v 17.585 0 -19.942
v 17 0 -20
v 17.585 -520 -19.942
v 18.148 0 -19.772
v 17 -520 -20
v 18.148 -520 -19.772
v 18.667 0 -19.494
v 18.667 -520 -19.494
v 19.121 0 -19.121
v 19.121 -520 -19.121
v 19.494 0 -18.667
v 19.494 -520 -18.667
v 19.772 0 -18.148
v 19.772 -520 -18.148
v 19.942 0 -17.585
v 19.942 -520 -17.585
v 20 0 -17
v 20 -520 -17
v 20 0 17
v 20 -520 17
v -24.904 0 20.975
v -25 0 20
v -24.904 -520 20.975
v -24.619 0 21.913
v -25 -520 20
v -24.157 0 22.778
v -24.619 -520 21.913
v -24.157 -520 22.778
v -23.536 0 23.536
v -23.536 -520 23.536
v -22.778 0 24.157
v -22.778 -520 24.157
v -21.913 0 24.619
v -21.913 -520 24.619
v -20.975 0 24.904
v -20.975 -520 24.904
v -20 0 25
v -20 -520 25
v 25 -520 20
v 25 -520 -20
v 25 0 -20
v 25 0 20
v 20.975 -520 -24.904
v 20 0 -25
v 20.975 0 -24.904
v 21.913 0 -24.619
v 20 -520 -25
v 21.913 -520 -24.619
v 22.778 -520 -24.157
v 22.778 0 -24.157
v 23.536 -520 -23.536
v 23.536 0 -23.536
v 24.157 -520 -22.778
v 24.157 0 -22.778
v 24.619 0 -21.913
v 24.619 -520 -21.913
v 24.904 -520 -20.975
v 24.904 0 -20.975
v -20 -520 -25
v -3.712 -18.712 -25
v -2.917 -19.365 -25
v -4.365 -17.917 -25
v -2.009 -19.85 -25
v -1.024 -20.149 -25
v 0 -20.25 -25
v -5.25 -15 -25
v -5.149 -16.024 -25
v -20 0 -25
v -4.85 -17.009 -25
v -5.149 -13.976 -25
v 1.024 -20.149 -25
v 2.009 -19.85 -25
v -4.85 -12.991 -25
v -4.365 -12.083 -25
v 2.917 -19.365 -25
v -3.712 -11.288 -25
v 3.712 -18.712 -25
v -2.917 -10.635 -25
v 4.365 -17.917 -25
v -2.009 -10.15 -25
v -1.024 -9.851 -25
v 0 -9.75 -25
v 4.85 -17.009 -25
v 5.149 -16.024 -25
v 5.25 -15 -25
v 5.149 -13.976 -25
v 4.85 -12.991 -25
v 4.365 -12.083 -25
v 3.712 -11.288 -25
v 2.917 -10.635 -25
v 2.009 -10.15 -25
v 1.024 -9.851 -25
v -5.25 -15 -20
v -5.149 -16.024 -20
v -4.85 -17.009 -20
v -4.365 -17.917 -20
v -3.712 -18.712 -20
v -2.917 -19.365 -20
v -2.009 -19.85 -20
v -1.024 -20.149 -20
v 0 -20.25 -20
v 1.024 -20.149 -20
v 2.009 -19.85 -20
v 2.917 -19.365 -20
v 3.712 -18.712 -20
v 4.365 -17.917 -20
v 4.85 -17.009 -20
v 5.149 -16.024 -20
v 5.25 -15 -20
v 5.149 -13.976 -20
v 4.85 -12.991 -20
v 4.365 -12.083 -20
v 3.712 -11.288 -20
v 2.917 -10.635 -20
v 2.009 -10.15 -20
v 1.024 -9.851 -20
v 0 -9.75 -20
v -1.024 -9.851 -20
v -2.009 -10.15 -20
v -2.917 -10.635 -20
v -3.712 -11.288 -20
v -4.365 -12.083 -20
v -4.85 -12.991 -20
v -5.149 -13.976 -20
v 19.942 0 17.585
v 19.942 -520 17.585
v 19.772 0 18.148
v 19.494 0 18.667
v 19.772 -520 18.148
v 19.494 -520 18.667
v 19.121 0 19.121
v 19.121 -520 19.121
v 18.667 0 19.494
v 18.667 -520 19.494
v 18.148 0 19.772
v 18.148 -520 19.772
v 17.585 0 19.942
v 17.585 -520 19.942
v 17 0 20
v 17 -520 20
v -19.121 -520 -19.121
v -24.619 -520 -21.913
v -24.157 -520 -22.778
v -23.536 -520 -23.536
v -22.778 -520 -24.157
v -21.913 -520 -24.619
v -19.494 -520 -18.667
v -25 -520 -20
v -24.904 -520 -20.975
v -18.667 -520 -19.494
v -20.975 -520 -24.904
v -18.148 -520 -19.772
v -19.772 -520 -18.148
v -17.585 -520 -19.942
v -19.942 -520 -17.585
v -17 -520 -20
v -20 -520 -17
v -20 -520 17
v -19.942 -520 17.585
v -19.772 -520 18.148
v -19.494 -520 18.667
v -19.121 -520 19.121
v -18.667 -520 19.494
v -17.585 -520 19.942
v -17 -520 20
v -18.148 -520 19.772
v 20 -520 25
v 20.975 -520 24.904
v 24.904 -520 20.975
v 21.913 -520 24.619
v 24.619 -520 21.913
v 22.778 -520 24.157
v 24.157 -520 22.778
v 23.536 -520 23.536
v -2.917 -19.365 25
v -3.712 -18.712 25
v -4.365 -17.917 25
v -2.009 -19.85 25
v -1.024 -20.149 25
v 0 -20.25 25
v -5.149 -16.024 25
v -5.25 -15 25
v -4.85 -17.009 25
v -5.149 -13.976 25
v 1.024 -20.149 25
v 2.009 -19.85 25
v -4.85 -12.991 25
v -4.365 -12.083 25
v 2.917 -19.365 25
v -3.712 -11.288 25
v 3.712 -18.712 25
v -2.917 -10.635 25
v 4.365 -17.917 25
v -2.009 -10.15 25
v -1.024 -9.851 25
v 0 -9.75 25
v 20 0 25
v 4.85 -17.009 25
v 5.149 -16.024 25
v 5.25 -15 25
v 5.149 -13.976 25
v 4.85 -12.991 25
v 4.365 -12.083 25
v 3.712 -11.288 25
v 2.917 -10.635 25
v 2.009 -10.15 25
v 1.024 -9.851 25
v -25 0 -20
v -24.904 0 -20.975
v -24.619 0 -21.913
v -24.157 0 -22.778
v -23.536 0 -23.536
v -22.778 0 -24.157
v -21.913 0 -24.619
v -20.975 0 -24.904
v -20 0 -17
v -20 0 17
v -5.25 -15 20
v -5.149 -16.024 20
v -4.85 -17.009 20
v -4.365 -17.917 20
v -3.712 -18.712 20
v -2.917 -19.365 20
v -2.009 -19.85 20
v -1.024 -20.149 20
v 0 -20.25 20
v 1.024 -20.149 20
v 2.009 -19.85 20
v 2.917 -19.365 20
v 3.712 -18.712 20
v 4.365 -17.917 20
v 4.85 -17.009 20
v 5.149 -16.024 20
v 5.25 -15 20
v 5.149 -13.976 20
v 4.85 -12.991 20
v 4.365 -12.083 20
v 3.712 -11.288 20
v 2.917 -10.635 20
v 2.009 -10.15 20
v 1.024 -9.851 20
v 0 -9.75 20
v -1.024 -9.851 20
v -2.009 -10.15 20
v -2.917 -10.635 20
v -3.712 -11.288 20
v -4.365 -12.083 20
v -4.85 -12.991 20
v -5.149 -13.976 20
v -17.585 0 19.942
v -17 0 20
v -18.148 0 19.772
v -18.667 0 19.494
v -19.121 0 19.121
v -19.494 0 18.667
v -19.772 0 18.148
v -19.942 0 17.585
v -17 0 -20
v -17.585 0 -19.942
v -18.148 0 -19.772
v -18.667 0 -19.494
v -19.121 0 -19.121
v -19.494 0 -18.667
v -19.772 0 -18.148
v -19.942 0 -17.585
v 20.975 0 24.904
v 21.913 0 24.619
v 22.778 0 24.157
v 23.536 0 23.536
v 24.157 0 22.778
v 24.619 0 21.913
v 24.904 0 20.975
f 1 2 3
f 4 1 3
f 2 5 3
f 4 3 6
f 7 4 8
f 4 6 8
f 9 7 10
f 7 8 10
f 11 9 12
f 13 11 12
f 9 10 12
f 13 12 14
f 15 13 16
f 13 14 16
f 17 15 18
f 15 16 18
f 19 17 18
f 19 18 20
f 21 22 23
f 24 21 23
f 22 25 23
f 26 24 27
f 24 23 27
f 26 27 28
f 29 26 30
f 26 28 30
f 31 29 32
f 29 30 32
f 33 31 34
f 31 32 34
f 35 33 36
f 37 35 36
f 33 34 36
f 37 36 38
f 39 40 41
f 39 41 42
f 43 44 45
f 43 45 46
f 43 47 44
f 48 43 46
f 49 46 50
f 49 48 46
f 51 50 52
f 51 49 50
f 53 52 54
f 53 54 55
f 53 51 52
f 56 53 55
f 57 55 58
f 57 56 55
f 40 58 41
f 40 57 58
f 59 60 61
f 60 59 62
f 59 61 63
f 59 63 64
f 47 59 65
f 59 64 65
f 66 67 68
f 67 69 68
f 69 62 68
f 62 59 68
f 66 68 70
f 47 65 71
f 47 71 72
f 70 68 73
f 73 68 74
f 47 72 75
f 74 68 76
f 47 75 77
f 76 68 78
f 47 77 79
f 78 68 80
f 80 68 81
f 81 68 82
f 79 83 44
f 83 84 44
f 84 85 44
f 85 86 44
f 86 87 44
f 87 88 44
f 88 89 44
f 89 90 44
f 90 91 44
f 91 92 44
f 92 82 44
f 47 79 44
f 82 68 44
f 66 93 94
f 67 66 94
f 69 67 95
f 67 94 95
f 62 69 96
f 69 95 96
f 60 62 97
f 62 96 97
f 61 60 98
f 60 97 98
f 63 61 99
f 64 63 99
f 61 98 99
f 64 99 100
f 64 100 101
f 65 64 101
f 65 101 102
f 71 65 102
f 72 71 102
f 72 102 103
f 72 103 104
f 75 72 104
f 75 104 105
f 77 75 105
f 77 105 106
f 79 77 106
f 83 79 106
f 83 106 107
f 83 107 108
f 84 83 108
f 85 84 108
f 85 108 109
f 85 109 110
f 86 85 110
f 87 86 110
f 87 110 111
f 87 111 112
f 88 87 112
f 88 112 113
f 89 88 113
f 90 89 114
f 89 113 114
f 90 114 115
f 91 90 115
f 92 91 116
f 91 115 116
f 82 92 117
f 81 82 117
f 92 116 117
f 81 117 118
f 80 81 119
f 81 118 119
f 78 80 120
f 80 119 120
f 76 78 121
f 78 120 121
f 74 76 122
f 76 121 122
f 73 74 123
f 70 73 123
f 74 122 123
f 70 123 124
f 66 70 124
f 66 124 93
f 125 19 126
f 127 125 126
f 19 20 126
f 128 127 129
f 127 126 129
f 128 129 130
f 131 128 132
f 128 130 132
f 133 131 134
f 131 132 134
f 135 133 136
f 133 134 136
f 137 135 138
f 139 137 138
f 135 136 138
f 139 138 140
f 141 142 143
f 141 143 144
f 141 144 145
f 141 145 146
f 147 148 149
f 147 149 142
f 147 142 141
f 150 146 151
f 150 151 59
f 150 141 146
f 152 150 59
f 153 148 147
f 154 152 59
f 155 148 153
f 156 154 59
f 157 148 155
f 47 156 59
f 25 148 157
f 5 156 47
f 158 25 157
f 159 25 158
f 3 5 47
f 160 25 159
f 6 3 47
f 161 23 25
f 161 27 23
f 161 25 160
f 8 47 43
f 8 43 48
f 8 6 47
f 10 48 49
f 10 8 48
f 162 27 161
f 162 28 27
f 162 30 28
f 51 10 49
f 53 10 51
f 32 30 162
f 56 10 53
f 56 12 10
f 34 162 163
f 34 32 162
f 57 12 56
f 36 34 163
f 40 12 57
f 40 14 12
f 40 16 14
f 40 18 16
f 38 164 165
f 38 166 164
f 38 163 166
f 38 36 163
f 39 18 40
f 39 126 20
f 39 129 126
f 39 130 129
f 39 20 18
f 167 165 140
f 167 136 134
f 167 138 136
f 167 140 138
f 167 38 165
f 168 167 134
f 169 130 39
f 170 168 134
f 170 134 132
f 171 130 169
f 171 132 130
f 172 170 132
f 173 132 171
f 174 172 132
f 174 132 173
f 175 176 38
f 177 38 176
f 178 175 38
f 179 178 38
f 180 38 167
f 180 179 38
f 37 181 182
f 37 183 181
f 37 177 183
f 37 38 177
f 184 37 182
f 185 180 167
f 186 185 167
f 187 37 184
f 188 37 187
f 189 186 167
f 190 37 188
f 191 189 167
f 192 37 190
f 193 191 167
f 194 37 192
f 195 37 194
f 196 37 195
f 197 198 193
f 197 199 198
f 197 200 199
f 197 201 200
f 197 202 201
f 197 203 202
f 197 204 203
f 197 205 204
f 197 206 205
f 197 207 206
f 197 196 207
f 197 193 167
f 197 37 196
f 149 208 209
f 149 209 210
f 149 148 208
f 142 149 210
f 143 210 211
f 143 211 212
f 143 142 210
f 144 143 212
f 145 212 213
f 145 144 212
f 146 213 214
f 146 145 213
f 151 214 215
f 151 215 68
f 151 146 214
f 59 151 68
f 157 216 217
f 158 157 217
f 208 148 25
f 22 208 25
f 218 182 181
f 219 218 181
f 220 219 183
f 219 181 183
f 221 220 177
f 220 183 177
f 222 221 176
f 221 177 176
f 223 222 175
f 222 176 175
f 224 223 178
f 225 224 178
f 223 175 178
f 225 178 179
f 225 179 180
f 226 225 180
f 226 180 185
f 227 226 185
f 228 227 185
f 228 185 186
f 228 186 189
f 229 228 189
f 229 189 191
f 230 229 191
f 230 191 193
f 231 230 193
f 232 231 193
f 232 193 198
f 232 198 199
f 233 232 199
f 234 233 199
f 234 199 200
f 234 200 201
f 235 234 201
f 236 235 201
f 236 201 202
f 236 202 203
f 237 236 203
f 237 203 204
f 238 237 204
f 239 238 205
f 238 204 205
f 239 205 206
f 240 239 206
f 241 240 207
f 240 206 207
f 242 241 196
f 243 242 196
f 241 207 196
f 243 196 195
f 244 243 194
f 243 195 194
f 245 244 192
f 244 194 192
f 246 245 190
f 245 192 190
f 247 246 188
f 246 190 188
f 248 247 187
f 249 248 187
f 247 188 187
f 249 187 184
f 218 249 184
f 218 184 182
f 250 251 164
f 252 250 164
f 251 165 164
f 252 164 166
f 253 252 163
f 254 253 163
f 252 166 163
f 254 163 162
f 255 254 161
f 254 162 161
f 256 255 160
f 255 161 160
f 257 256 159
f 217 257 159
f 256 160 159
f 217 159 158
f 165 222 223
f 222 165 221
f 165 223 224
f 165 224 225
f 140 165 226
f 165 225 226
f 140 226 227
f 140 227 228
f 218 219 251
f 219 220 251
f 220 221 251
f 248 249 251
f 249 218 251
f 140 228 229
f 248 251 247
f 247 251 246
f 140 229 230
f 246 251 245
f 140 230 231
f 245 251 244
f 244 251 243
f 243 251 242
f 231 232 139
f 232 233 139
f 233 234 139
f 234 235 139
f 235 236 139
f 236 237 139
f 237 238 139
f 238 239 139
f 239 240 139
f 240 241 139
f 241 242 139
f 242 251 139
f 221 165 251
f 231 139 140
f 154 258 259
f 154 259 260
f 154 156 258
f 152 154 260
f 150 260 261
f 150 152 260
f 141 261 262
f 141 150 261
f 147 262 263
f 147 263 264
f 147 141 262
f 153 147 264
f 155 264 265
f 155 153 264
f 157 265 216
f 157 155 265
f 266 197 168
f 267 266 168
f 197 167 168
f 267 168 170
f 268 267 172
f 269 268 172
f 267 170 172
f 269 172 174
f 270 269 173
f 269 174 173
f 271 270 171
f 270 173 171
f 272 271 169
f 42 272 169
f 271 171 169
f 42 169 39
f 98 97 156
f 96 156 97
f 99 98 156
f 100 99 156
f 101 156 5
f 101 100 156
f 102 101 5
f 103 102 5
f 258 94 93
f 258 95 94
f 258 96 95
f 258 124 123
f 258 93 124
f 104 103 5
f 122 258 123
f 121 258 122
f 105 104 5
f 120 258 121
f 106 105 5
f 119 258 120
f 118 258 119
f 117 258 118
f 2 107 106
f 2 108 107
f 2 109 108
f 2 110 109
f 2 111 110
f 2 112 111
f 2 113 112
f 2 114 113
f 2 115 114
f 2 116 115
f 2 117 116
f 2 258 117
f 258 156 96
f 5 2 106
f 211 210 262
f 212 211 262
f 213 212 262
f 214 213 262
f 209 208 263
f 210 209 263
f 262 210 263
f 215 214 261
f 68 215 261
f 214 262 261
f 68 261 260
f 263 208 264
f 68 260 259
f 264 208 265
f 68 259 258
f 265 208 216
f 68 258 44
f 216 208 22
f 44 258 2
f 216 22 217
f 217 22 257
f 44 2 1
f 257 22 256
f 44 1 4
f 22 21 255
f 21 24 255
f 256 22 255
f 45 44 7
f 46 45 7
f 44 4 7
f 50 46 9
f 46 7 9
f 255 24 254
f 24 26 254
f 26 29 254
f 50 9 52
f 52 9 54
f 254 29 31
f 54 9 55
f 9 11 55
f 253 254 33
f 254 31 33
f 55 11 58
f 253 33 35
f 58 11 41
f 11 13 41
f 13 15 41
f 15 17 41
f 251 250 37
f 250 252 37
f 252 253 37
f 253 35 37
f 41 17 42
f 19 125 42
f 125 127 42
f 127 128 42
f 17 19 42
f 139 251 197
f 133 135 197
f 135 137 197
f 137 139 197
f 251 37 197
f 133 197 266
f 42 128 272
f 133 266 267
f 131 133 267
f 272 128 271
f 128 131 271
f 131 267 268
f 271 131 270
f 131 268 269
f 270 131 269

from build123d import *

# Parameters (mm, degrees)
F0_W     = 50
F0_H     = 50
F0_W_2   = 40
F0_H_2   = 40
F1_DEPTH = 520
F2_R     = 5
F3_R     = 3
F5_D     = 10.5


with BuildPart() as f1:
    # F0 (on Front) → F1 (new body)
    with BuildSketch(Plane.XZ):
        Rectangle(F0_W, F0_H)
        Rectangle(F0_W_2, F0_H_2, mode=Mode.SUBTRACT)
    extrude(amount=F1_DEPTH)

    # F2
    f2_edges = [f1.edges().sort_by_distance(p)[0] for p in [
        (25, -260, 25),
        (-25, -260, 25),
        (25, -260, -25),
        (-25, -260, -25),
    ]]
    fillet(f2_edges, radius=F2_R)

    # F3
    f3_edges = [f1.edges().sort_by_distance(p)[0] for p in [
        (-20, -260, 20),
        (20, -260, 20),
        (20, -260, -20),
        (-20, -260, -20),
    ]]
    fillet(f3_edges, radius=F3_R)

    # F5 (through all)
    with Locations(Plane(origin=(0, 0, -25), x_dir=(1, 0, 0), z_dir=(0, 0, -1))):
        with Locations((0, 15)):
            Hole(F5_D / 2)


solid = f1.part
